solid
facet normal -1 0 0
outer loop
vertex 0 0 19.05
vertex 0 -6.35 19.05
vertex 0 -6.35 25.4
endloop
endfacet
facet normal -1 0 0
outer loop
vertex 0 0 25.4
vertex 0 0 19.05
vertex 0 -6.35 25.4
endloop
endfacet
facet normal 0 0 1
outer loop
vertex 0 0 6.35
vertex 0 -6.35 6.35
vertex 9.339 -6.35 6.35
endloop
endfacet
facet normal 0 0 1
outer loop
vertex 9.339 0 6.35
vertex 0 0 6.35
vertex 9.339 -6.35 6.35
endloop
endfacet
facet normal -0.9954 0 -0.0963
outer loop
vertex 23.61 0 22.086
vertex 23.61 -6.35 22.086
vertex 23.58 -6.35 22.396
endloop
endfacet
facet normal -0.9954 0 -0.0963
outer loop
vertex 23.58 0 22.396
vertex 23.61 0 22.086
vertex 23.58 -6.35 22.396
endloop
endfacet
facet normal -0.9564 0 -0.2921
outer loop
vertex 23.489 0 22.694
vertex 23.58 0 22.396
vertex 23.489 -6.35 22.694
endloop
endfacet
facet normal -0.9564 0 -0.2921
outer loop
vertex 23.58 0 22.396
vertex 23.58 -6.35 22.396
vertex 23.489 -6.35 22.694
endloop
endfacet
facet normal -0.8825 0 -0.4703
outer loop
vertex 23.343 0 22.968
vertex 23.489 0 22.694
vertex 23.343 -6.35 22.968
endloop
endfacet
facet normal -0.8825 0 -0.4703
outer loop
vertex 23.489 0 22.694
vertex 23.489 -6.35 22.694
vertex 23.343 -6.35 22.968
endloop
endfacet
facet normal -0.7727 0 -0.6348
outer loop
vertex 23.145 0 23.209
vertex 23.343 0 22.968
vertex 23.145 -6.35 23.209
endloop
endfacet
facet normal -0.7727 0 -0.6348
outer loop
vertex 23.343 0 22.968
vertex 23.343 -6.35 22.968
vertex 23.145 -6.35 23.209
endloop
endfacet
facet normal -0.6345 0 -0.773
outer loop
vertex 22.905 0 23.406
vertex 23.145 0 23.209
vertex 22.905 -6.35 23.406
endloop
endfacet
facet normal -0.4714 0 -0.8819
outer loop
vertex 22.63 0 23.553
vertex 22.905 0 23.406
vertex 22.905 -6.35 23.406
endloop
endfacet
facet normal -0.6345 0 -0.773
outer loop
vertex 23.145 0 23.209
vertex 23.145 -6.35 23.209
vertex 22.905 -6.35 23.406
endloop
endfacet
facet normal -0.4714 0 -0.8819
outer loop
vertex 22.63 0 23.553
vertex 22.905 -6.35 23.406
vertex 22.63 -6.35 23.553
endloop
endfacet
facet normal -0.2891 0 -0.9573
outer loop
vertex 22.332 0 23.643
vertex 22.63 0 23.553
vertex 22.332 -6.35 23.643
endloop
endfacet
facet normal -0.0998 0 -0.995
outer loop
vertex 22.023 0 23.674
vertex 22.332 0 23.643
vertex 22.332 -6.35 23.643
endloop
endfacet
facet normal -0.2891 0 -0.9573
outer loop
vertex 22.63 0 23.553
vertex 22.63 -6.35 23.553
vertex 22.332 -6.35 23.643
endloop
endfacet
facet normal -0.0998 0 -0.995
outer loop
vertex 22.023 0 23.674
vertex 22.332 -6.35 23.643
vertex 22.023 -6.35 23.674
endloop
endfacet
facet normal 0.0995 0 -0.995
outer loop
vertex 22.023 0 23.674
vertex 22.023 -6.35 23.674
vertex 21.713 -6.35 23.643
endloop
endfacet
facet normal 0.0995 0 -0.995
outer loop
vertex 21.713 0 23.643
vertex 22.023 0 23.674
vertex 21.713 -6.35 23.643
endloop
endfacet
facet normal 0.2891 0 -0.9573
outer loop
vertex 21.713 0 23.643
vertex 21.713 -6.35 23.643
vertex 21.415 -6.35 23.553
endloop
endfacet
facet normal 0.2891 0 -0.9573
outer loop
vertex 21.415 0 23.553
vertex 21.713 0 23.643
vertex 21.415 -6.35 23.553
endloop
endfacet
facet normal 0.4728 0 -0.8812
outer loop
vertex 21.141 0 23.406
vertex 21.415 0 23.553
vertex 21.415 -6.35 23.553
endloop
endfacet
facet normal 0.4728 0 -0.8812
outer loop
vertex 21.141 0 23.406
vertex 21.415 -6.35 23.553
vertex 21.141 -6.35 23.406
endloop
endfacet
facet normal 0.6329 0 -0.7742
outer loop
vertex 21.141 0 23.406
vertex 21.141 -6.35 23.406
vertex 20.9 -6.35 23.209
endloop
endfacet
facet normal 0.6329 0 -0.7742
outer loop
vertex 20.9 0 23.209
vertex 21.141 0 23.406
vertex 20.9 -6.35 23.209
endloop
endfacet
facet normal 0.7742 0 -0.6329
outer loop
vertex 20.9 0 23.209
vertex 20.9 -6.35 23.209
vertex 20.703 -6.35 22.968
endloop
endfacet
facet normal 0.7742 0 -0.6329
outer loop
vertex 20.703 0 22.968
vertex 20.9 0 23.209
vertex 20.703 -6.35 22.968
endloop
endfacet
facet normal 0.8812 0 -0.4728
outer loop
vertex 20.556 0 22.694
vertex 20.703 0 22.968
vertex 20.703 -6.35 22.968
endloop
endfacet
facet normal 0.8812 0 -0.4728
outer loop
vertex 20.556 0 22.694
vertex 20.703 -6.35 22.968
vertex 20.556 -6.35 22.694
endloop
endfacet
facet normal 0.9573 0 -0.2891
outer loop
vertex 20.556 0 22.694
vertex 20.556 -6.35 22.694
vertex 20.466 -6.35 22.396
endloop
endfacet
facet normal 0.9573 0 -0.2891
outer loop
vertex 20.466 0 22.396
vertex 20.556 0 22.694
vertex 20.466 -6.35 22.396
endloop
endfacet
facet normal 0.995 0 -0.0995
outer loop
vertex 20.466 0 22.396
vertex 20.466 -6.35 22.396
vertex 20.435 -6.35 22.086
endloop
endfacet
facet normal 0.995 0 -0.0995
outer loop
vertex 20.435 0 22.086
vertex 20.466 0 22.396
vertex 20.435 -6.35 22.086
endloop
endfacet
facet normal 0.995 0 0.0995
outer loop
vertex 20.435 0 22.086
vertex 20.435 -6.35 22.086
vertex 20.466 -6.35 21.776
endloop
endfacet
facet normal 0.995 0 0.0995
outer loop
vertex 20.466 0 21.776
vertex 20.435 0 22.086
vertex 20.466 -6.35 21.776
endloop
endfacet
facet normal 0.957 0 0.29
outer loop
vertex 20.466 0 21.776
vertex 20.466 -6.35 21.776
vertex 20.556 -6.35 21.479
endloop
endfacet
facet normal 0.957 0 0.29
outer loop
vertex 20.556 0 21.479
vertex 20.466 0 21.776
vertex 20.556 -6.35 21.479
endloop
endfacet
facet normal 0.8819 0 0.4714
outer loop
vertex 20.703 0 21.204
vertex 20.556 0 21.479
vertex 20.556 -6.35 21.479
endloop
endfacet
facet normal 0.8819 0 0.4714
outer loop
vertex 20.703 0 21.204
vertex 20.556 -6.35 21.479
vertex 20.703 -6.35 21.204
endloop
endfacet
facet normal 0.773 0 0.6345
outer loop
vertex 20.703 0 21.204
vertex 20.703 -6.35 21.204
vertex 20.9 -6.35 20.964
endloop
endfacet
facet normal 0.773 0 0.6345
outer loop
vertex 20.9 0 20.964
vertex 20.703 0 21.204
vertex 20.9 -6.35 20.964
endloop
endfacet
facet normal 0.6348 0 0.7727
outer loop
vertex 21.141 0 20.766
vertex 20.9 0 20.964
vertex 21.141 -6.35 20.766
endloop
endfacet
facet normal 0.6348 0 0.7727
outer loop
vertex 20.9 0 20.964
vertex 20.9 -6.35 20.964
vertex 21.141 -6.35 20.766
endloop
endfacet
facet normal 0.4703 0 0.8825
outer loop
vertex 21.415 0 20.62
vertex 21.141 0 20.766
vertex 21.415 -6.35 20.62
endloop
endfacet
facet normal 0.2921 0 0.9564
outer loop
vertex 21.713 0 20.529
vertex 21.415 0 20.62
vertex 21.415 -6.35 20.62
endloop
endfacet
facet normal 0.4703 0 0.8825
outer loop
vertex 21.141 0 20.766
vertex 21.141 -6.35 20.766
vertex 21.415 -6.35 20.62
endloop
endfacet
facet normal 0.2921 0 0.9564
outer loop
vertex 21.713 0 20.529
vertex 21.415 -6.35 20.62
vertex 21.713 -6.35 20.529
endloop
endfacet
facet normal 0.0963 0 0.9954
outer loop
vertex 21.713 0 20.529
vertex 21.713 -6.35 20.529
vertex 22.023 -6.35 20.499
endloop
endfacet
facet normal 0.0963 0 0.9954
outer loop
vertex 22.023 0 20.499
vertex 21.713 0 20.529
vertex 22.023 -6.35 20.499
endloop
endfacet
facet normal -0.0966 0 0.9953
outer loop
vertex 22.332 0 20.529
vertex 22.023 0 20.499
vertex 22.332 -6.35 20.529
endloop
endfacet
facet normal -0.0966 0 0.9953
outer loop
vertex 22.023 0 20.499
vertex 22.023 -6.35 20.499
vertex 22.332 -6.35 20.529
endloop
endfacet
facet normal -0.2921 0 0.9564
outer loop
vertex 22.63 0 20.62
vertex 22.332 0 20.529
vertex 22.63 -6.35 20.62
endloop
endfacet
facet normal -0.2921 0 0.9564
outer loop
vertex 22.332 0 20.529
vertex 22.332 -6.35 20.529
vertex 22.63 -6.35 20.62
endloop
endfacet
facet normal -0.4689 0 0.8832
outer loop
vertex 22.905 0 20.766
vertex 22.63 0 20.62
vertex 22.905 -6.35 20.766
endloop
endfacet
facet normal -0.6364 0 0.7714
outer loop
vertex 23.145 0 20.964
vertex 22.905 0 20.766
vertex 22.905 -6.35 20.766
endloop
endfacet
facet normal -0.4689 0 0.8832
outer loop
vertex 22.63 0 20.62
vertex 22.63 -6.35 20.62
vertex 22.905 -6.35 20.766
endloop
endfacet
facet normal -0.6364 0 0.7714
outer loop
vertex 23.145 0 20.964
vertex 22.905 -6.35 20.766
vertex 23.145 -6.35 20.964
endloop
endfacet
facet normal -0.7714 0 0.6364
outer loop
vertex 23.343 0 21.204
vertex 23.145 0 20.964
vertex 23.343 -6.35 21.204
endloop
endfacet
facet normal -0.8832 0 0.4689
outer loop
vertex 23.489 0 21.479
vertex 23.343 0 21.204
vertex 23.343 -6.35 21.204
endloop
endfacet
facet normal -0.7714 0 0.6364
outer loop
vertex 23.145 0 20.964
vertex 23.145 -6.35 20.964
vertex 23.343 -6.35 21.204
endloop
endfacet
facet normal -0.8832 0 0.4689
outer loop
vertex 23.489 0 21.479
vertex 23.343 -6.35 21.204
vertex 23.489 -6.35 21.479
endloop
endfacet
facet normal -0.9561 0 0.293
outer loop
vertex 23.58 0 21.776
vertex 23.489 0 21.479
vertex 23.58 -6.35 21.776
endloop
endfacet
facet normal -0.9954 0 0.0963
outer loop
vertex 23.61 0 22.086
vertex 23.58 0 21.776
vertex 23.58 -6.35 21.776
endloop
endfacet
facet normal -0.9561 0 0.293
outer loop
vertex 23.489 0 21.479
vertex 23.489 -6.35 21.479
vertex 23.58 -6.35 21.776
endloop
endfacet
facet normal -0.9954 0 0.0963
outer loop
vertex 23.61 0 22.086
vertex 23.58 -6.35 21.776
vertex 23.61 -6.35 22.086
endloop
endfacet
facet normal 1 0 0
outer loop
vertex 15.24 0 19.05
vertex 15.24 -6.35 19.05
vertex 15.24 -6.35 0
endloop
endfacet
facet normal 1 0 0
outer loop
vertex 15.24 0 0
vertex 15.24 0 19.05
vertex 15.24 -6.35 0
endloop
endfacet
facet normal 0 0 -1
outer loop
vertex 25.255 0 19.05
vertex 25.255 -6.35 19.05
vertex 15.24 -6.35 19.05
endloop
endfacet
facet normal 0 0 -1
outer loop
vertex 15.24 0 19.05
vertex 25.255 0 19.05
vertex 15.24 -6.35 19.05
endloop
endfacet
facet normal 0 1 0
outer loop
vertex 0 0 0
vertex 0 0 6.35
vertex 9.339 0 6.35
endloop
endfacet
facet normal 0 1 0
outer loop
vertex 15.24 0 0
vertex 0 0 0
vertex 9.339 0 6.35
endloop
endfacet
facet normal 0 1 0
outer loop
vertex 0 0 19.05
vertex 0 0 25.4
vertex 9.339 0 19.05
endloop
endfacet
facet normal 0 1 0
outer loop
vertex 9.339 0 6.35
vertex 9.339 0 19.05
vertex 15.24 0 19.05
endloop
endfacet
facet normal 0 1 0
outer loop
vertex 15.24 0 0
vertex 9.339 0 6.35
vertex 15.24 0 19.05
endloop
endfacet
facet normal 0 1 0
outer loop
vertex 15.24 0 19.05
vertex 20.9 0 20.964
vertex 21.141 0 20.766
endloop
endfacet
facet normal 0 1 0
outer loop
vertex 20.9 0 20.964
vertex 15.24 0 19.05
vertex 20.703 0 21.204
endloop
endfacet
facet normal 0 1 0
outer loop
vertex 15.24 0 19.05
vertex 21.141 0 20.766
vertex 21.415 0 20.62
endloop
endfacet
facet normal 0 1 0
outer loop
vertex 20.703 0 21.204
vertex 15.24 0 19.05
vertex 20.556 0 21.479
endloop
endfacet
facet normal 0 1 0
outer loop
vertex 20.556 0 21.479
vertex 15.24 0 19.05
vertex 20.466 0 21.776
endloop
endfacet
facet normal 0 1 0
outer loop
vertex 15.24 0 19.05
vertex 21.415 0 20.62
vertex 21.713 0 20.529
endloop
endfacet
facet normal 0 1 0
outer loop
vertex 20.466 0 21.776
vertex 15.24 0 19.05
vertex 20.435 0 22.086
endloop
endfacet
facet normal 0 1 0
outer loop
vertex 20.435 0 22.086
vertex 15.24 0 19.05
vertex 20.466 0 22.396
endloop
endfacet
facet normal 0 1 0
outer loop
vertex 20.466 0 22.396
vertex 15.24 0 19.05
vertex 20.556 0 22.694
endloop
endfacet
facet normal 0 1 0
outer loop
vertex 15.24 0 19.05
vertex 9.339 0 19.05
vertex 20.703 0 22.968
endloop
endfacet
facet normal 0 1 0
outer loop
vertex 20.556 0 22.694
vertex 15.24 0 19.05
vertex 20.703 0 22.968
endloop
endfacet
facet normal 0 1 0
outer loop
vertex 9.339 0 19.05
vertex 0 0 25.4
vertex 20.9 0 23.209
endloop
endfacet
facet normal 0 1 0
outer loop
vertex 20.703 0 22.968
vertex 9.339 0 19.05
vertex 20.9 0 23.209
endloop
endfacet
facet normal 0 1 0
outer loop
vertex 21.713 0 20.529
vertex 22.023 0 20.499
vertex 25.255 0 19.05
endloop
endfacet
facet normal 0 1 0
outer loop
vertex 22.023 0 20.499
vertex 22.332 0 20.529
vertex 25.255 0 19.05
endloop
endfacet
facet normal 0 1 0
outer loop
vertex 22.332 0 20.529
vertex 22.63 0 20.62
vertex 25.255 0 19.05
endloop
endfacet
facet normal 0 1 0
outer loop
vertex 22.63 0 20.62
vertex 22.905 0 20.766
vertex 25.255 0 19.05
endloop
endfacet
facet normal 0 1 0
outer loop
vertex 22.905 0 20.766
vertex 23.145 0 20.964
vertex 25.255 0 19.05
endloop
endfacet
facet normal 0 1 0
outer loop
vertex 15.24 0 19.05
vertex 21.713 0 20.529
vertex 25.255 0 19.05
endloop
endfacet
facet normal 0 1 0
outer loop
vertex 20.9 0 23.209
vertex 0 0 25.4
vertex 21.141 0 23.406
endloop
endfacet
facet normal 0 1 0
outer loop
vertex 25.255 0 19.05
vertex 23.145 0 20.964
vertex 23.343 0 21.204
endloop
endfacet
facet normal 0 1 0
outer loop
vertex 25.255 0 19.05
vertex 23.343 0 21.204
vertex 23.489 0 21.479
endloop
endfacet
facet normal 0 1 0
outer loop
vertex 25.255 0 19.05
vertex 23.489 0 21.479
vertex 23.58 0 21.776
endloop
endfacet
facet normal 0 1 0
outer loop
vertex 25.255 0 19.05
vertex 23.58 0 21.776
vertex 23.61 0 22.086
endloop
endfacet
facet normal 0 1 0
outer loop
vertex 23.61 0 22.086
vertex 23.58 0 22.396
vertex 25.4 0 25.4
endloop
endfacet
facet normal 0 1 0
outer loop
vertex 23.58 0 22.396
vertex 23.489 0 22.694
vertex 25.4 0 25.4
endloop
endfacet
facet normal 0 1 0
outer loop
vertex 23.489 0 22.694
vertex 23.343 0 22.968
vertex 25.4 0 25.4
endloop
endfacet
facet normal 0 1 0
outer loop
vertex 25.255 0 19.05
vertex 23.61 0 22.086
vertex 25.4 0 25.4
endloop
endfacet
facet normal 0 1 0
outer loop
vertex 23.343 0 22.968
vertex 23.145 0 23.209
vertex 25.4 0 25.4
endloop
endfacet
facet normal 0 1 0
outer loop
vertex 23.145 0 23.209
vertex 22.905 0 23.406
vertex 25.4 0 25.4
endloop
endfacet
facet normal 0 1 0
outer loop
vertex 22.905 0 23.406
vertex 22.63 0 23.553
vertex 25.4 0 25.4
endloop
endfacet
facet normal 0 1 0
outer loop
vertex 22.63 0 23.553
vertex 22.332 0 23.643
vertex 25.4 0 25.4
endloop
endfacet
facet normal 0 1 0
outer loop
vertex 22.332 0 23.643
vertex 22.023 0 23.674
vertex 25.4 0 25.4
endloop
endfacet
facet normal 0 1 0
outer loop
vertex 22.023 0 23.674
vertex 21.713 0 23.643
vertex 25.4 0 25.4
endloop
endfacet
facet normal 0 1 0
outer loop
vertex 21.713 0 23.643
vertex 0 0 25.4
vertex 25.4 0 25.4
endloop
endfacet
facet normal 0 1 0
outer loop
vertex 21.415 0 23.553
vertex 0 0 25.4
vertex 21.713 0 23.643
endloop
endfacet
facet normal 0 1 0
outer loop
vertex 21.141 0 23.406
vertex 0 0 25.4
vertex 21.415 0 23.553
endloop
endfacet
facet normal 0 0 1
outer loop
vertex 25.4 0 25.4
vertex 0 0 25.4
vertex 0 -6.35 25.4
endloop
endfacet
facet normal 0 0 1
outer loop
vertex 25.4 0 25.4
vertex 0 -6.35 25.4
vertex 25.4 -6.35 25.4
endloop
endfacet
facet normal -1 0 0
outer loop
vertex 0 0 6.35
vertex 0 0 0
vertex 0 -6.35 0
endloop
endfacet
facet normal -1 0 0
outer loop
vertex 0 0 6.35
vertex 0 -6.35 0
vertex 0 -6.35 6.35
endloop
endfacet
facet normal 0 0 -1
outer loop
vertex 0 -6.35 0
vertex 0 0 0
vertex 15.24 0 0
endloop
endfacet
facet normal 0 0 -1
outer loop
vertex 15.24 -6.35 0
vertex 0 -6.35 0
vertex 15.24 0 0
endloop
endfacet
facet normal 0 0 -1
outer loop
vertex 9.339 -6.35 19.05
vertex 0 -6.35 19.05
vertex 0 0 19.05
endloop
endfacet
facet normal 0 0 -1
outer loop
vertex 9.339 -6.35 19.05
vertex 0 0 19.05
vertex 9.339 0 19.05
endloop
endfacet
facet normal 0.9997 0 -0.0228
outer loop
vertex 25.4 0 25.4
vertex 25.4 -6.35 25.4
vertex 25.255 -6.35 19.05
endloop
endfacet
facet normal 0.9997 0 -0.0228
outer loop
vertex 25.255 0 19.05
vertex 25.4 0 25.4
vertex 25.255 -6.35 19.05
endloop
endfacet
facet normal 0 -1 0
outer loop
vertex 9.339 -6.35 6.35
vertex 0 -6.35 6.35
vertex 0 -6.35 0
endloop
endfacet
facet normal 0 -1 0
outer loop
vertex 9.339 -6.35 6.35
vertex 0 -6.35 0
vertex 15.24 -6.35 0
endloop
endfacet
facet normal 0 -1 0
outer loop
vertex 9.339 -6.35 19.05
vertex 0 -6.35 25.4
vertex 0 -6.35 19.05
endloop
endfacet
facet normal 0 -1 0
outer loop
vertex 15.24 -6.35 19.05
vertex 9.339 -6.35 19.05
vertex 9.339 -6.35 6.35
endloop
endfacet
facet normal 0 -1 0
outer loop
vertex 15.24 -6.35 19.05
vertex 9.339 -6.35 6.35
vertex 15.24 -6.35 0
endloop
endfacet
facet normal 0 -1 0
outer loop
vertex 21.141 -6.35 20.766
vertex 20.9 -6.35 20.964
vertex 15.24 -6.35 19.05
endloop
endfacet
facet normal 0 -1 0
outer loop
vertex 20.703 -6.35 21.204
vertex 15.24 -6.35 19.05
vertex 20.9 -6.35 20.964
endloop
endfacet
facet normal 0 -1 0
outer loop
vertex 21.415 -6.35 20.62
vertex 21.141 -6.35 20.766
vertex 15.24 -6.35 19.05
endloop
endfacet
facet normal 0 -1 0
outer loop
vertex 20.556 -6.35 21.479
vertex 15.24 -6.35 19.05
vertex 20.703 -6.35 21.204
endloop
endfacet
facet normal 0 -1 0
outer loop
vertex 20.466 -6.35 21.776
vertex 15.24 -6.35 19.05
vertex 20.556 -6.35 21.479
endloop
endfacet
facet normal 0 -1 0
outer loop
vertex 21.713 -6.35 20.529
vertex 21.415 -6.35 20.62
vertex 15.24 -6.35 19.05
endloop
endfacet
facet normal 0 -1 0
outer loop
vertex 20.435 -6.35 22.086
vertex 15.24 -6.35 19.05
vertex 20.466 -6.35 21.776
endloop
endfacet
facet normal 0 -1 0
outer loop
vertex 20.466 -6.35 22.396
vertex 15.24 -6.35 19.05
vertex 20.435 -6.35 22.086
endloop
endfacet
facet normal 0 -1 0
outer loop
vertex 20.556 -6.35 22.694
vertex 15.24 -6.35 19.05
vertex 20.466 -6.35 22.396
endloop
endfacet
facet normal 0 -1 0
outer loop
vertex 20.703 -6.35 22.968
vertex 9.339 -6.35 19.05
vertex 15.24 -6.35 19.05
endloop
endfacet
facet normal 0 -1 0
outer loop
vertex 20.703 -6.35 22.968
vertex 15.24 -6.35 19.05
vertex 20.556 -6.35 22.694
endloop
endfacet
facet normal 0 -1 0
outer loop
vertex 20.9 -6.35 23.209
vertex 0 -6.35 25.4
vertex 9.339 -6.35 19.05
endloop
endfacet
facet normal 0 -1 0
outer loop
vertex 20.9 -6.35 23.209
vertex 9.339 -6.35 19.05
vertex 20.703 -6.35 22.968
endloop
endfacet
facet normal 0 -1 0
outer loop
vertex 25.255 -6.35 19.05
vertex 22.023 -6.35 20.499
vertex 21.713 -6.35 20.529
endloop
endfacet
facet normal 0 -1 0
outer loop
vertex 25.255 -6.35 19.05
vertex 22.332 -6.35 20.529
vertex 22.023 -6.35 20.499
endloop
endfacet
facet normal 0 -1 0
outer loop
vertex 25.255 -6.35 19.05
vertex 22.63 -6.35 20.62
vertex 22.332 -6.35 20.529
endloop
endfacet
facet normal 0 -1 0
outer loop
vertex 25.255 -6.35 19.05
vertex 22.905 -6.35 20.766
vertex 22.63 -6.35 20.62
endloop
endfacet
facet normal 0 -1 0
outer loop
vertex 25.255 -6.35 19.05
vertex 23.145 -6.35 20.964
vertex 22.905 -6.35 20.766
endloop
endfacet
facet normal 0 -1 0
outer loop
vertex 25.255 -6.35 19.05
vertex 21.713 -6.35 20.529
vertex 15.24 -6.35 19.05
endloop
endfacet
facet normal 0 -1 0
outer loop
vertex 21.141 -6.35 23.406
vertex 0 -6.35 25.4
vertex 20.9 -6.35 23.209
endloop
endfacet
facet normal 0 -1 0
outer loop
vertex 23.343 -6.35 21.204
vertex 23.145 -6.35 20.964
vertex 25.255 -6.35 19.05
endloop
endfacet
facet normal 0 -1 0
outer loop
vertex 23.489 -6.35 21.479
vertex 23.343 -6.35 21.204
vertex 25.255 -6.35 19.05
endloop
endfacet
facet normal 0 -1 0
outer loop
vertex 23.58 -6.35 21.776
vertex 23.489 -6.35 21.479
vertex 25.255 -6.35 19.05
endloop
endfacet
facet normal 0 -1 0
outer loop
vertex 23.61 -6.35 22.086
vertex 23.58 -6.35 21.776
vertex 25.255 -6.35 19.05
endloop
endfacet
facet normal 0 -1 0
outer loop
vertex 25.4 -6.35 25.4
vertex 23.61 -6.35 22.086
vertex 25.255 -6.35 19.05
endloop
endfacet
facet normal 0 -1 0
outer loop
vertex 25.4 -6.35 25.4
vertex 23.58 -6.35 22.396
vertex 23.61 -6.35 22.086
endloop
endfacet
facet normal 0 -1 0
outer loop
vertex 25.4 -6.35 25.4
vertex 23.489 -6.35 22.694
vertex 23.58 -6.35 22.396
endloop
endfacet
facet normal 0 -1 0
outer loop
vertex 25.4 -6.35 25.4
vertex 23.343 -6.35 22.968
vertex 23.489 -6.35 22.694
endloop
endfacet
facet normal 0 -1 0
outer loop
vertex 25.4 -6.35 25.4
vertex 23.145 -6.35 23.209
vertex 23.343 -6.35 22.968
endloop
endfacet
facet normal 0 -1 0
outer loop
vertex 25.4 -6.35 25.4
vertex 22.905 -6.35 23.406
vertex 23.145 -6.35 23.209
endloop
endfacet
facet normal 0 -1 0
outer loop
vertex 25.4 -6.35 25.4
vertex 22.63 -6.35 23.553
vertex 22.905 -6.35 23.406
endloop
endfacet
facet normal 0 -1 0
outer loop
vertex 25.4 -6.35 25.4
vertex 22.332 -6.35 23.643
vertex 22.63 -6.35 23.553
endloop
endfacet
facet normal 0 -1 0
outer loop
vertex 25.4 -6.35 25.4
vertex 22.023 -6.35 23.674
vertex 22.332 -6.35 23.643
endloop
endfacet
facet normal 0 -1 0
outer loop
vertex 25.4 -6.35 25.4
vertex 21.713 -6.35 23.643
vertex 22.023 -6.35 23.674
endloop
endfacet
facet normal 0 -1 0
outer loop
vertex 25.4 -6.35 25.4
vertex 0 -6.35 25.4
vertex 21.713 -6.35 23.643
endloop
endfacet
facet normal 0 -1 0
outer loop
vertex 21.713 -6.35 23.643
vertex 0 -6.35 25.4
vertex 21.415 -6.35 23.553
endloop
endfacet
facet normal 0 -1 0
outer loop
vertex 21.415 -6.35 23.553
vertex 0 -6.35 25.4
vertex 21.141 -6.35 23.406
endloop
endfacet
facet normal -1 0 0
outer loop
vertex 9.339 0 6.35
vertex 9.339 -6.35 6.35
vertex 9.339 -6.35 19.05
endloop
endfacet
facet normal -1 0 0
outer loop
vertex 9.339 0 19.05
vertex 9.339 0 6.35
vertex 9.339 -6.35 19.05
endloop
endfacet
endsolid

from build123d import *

# Parameters (mm, degrees)
F0_W     = 25.4
F0_H     = 25.4
F1_DEPTH = 6.35
F2_W     = 9.33873
F2_H     = 12.7
F3_DEPTH = 25.4
F4_R     = 1.5875
F5_DEPTH = 25.4


with BuildPart() as f1:
    # F0 (on Front) → F1 (new body)
    with BuildSketch(Plane.XZ):
        with Locations((12.7, 12.7)):
            Rectangle(F0_W, F0_H)
    extrude(amount=F1_DEPTH)

    # F2 (on face) → F3 (cut)
    with BuildSketch(Plane.XZ.offset(6.35)):
        with Locations((4.669365, 12.7)):
            Rectangle(F2_W, F2_H)
        Polygon((25.4, 0), (25.4, 25.4), (25.255403, 19.05), (15.24, 19.05), (15.24, 0), align=None)
    extrude(amount=-F3_DEPTH, mode=Mode.SUBTRACT)

    # F4 (on face) → F5 (cut)
    with BuildSketch(Plane.XZ.offset(6.35)):
        with Locations((22.022767, 22.086186)):
            Circle(F4_R)
    extrude(amount=-F5_DEPTH, mode=Mode.SUBTRACT)


solid = f1.part
